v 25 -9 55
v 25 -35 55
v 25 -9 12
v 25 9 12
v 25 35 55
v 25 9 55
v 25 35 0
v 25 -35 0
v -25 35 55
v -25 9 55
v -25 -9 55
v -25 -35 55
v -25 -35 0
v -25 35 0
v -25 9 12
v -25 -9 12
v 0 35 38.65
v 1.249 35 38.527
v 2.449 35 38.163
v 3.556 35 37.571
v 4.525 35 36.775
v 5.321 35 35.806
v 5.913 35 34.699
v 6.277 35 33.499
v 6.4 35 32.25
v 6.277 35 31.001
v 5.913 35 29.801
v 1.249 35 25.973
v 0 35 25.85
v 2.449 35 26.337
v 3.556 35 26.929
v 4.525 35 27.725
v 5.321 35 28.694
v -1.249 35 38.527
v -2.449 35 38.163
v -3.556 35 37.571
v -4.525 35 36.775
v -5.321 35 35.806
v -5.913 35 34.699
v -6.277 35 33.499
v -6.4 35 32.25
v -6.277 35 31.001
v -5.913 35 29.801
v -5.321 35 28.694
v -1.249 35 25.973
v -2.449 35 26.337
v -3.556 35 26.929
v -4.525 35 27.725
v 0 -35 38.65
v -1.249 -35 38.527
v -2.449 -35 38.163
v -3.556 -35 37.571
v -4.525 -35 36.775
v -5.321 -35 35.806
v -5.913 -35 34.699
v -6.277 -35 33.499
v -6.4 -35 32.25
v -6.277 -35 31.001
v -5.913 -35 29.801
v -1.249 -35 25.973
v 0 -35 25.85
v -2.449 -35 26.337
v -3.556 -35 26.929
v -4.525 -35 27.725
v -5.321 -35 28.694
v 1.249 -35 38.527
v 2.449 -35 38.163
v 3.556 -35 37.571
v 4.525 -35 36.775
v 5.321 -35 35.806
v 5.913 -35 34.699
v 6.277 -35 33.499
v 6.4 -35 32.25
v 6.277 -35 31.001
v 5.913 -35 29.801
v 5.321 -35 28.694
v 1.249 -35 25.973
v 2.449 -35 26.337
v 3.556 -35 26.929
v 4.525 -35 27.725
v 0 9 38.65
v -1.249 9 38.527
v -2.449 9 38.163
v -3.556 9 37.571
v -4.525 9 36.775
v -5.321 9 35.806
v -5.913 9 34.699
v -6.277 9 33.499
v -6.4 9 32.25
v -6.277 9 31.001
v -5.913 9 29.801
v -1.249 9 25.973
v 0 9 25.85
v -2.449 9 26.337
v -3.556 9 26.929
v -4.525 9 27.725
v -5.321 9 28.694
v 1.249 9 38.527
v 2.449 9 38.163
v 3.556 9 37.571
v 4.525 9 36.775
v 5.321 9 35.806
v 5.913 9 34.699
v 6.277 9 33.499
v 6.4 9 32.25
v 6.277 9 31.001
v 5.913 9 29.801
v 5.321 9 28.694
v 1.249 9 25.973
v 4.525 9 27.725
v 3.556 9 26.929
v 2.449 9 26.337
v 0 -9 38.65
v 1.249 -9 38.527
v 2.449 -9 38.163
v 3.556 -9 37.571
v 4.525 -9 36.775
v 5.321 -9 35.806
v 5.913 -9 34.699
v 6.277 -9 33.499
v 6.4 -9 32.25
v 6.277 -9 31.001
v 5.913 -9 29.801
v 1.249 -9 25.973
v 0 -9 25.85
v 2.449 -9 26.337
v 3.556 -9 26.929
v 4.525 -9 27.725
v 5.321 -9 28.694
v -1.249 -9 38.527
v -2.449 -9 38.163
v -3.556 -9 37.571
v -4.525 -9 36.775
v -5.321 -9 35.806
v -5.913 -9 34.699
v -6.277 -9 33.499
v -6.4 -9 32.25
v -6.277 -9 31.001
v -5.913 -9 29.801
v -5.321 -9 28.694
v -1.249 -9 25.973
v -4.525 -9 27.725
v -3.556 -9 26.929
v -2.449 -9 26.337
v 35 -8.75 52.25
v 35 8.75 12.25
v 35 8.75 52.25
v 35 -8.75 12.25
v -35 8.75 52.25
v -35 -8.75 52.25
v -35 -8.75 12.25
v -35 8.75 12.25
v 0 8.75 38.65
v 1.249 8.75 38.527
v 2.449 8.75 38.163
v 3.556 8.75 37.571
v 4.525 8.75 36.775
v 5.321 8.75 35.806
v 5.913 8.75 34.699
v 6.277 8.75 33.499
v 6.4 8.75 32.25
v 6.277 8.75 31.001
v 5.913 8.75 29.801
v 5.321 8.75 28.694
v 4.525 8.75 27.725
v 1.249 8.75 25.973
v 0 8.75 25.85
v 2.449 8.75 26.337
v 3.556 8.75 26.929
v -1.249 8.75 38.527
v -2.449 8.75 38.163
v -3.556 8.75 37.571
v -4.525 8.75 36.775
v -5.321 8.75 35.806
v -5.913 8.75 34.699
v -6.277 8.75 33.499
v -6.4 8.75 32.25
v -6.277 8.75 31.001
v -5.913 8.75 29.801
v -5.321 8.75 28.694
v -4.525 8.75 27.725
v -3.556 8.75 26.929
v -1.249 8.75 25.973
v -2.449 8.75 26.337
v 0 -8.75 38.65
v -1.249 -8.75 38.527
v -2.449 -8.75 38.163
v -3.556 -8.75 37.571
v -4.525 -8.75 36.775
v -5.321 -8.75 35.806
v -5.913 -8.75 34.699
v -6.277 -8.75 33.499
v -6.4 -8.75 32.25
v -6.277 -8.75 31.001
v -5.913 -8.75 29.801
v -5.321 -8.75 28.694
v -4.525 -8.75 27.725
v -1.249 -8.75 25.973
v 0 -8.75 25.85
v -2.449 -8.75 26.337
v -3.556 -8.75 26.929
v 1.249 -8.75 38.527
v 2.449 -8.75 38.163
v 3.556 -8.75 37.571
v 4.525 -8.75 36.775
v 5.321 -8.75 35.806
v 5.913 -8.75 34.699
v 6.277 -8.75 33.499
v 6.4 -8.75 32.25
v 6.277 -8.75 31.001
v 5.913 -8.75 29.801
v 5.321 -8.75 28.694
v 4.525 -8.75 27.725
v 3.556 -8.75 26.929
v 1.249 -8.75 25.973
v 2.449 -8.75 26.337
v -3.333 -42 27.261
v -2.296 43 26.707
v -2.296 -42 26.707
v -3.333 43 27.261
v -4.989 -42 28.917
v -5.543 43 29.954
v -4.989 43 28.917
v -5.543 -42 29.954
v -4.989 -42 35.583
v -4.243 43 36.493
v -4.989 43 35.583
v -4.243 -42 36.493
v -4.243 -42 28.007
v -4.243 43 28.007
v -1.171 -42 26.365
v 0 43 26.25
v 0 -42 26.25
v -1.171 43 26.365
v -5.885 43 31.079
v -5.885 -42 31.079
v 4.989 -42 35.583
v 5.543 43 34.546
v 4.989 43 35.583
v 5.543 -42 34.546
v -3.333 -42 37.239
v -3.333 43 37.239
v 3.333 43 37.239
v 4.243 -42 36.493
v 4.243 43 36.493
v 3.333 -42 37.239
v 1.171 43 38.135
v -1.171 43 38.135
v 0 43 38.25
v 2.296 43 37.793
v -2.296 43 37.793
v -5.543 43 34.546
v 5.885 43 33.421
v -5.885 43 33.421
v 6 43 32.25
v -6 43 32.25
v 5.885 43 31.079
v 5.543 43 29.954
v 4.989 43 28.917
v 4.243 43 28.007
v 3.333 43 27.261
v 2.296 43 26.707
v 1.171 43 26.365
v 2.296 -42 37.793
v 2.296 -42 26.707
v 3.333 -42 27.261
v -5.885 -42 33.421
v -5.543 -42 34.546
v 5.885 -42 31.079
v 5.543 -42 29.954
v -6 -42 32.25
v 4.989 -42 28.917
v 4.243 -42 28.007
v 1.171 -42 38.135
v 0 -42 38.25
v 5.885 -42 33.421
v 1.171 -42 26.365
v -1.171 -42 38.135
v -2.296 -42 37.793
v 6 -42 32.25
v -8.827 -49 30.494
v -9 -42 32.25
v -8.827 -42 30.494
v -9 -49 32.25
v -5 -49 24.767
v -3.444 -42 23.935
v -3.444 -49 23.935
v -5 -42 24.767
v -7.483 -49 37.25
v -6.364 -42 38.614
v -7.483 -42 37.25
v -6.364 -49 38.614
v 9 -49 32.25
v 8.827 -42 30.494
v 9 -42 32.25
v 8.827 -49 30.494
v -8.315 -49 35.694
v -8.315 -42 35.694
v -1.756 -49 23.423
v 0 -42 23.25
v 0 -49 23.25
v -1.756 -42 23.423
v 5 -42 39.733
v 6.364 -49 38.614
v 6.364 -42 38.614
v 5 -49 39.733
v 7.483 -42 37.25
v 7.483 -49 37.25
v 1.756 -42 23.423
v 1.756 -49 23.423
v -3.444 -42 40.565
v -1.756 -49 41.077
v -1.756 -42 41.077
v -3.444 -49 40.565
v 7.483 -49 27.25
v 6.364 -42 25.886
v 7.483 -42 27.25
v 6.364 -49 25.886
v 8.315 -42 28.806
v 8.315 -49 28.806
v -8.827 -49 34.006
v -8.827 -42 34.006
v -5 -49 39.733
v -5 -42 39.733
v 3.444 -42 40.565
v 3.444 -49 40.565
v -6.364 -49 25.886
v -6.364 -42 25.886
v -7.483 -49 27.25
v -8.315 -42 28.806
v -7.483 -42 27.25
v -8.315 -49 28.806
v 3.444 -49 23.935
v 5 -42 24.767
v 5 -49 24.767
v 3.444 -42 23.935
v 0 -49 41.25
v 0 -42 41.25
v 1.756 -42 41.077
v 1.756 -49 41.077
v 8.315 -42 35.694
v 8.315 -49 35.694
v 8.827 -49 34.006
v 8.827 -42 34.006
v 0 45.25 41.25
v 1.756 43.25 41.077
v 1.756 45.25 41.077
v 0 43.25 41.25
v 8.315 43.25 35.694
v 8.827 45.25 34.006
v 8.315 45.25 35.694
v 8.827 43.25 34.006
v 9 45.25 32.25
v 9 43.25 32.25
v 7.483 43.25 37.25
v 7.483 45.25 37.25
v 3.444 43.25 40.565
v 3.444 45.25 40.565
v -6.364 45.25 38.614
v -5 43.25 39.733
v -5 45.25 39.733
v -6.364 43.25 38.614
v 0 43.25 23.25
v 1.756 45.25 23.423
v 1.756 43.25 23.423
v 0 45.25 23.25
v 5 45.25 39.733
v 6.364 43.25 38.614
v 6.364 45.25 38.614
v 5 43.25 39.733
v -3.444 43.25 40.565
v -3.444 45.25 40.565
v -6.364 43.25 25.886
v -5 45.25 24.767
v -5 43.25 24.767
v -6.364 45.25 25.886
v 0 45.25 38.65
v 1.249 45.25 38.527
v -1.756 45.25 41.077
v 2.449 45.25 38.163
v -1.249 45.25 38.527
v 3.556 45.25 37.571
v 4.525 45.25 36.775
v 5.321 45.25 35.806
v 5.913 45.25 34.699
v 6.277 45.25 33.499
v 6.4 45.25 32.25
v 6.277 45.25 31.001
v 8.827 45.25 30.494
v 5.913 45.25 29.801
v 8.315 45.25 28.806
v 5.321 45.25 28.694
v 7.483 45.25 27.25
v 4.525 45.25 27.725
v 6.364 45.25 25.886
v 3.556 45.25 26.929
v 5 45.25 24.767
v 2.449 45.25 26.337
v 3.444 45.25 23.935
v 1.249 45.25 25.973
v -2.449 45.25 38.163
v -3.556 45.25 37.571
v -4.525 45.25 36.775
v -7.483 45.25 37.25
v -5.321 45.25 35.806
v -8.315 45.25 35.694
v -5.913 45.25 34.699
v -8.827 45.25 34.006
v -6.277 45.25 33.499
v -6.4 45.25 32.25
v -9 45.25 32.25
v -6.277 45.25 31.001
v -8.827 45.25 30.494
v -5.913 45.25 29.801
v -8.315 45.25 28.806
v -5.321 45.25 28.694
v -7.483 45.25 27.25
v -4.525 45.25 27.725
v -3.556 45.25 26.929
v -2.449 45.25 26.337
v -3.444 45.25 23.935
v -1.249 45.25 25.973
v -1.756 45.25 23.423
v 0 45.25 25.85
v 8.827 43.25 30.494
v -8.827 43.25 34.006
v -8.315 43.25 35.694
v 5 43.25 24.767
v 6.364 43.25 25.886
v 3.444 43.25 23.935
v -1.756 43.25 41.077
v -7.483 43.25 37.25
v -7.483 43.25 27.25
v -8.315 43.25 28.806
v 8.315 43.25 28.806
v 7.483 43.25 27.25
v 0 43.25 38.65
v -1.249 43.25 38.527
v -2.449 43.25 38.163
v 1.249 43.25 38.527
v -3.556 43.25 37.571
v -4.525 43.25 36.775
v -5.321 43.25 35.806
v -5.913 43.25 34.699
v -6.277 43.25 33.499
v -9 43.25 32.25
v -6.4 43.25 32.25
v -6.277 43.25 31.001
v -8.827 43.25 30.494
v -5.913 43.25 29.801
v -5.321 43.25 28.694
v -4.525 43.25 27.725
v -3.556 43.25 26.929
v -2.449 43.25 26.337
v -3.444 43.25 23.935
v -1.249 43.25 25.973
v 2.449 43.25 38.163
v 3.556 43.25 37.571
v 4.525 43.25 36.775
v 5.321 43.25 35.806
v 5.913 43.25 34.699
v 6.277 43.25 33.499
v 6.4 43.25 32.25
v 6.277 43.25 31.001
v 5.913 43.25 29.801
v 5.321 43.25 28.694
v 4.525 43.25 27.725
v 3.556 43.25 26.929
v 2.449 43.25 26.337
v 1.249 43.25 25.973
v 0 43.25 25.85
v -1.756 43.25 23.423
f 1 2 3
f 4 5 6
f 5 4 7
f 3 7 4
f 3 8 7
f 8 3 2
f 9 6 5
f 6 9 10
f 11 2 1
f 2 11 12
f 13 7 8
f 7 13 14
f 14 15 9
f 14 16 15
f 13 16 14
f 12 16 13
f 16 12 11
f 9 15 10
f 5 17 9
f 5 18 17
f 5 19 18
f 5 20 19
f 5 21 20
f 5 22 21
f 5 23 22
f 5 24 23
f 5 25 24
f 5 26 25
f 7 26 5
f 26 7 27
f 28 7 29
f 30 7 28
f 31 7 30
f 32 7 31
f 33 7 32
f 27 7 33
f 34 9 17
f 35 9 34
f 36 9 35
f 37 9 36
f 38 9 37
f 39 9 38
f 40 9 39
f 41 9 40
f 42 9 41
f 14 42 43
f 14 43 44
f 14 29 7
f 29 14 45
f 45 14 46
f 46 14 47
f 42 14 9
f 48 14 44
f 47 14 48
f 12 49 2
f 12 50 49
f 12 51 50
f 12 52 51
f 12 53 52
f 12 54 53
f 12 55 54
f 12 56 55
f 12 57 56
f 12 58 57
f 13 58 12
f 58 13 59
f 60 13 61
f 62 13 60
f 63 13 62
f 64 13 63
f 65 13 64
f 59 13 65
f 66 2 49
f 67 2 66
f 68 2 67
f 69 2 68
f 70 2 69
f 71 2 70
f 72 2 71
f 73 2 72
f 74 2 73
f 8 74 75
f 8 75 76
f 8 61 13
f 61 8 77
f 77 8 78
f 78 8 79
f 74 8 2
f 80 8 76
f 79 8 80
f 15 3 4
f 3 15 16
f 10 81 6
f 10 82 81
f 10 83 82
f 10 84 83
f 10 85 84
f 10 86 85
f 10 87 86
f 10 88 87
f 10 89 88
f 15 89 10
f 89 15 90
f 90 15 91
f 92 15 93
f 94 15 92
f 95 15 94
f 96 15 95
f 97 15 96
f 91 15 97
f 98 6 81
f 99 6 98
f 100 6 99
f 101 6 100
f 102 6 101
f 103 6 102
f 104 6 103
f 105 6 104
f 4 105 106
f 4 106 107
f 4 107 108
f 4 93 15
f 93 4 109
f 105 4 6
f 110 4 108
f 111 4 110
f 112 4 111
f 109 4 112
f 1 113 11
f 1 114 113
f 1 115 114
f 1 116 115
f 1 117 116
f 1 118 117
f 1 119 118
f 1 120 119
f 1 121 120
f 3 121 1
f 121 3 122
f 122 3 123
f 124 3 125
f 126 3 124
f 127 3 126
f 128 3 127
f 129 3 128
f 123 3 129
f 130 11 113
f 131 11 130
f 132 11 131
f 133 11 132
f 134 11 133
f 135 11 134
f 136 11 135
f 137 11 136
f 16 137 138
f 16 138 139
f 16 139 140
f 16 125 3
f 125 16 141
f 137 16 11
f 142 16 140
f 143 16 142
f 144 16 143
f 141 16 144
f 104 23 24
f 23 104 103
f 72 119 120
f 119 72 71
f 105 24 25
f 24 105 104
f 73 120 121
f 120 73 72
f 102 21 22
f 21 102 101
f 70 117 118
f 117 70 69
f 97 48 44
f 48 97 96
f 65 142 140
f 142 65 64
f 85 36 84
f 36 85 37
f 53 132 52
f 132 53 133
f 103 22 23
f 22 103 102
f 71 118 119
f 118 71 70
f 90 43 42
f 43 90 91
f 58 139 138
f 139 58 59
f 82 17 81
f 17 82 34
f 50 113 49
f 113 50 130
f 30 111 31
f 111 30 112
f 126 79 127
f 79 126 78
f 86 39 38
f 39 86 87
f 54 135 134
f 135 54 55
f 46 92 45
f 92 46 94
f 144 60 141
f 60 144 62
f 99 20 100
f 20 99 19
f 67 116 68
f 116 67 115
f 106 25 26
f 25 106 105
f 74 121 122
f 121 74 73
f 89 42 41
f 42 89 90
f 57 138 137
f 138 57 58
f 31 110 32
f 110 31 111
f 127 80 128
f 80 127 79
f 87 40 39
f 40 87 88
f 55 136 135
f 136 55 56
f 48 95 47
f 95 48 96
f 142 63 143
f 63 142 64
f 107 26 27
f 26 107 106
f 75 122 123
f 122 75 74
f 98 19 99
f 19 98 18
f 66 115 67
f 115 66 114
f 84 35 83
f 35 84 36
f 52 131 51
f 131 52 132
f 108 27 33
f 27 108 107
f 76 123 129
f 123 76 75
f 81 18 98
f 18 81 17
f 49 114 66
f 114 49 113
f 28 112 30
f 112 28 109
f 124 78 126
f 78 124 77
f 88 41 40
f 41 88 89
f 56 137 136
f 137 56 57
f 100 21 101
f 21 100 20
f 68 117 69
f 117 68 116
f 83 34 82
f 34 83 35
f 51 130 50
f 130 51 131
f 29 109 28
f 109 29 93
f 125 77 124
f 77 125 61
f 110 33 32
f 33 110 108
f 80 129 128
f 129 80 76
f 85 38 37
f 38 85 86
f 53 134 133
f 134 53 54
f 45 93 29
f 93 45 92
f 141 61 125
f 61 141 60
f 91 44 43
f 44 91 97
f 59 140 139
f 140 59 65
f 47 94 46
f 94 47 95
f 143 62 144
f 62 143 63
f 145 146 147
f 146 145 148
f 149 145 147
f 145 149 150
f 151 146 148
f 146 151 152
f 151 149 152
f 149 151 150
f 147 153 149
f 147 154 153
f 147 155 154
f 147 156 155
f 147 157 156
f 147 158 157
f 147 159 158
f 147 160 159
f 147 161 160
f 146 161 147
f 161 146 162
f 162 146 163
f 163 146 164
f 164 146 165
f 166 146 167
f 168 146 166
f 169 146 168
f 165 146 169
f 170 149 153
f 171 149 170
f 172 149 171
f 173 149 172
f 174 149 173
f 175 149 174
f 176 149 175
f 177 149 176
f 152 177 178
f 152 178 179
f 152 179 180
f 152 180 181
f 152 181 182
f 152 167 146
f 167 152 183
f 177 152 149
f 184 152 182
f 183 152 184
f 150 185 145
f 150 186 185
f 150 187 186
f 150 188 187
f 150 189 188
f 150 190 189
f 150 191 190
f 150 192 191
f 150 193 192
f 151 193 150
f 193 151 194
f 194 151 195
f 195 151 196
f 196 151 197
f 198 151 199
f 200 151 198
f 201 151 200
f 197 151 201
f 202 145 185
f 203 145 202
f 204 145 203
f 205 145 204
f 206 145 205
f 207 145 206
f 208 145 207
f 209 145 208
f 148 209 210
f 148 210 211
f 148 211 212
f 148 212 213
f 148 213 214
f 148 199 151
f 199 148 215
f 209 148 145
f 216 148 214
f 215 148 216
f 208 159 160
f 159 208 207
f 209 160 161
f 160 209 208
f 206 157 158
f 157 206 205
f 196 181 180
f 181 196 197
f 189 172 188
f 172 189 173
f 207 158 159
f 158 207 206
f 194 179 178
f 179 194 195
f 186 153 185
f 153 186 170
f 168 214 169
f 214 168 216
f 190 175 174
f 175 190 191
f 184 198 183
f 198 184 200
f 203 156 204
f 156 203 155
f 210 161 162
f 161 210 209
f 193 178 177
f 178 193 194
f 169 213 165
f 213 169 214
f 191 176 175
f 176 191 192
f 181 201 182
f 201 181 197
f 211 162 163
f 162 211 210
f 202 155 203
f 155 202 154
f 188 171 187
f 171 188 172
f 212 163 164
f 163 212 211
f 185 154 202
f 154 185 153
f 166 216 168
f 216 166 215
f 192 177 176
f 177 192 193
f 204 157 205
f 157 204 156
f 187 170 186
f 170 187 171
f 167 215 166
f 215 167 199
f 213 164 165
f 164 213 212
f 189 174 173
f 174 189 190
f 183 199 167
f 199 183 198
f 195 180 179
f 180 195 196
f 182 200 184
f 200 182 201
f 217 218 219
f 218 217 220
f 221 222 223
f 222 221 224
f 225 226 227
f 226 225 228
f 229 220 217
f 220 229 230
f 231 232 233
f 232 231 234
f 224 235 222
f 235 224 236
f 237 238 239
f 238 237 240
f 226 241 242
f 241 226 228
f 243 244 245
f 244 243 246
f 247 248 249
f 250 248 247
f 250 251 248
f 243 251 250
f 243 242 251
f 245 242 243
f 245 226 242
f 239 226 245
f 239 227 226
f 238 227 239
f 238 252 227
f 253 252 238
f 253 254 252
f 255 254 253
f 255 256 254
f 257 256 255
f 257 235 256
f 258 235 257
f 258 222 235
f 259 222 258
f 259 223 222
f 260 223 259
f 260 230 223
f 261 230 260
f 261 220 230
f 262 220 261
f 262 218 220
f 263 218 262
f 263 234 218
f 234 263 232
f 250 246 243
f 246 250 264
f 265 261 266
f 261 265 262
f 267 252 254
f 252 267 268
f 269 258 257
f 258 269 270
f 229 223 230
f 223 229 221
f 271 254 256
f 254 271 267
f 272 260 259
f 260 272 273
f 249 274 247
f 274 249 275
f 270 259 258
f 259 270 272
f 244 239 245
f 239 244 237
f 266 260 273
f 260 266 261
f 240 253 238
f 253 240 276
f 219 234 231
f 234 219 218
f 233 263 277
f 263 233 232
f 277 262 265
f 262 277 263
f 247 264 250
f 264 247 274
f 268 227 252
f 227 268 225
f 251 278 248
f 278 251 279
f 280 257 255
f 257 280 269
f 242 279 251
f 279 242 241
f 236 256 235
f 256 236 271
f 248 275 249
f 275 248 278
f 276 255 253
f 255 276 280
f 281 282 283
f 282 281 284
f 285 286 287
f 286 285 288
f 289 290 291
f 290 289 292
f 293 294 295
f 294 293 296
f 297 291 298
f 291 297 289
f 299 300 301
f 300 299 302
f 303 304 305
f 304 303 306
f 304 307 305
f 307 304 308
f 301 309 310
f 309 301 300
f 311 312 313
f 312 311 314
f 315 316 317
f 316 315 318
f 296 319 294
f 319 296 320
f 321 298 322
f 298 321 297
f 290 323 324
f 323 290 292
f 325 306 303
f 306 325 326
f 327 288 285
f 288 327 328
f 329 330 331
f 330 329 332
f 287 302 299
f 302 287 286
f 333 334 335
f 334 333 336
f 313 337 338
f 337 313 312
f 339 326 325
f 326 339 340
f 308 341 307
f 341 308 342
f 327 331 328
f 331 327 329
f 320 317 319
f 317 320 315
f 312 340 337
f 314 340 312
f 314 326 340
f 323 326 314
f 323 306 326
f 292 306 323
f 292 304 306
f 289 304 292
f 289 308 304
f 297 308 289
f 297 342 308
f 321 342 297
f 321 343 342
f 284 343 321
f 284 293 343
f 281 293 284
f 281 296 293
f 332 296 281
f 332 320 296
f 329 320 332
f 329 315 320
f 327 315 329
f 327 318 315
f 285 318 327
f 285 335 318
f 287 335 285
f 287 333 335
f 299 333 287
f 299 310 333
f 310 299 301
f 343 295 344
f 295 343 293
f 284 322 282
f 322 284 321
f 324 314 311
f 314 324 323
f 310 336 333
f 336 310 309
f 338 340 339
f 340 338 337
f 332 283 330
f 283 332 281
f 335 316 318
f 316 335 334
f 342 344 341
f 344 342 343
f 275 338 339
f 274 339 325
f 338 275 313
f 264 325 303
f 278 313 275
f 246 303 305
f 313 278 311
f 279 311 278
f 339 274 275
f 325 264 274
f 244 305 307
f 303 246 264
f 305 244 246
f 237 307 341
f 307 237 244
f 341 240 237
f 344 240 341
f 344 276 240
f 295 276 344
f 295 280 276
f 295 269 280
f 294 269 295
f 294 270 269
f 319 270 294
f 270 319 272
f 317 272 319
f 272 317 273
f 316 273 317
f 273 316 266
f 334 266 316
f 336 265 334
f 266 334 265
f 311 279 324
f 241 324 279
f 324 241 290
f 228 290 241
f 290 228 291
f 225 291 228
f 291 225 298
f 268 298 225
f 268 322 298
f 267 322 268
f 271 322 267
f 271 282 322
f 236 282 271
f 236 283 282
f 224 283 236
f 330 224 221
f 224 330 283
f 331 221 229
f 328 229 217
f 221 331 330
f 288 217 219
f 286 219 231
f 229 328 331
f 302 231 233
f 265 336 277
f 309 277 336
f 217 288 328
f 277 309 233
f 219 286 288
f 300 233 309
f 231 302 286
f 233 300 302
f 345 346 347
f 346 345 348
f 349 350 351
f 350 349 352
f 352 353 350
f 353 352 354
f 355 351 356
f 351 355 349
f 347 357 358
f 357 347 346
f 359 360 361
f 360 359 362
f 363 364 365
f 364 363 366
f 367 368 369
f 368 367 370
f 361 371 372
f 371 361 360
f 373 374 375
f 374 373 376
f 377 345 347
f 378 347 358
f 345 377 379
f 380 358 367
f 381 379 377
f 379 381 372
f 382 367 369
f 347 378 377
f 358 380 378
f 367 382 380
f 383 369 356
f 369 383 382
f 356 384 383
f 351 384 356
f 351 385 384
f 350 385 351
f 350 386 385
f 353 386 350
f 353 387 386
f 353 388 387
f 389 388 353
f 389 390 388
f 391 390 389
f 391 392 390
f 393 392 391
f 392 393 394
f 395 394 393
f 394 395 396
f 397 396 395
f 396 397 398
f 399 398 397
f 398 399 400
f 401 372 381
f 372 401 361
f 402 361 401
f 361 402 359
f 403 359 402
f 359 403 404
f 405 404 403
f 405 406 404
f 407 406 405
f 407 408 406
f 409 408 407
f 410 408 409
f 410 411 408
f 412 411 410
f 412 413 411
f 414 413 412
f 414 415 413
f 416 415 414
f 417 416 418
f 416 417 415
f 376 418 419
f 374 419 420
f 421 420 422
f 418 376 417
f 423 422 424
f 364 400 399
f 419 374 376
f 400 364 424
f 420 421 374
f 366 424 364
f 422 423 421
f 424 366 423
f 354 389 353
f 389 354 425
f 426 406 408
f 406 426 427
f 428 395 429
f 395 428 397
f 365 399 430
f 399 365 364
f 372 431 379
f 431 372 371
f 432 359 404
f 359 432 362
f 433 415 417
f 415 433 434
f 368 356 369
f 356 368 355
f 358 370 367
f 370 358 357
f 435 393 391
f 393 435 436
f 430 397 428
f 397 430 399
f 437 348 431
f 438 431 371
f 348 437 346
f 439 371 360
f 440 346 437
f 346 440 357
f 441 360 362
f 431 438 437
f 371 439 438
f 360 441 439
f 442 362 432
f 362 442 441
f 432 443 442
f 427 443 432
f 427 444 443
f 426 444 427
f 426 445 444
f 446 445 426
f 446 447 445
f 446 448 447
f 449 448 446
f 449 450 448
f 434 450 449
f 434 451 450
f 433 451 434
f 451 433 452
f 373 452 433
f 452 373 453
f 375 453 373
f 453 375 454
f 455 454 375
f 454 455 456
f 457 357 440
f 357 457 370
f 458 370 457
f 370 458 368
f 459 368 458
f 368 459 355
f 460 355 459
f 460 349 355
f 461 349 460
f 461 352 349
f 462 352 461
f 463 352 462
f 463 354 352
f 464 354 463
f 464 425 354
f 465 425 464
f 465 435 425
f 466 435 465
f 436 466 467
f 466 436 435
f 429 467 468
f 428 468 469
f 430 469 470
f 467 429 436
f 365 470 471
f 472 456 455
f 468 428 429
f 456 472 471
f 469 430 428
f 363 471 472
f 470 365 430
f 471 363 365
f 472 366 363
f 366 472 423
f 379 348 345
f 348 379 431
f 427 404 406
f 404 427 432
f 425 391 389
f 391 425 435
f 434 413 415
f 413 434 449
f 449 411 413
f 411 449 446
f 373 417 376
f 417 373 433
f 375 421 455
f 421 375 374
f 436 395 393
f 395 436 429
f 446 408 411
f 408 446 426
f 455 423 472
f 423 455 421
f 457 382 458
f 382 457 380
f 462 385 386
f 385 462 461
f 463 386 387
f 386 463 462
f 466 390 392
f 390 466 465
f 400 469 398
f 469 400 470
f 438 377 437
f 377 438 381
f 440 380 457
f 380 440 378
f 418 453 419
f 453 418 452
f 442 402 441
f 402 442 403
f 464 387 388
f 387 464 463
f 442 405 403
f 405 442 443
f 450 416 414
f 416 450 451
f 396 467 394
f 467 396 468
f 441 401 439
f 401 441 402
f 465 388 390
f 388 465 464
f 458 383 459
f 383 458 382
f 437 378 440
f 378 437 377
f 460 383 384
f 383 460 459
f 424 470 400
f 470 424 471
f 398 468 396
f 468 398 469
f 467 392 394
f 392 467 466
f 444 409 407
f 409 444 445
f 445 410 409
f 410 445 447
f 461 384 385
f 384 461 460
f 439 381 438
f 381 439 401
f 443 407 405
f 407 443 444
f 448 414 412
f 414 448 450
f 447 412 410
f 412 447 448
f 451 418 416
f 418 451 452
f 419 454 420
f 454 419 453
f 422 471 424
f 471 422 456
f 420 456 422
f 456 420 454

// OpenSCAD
$fn = 32;

// ------------------------------------------------------------------------
// Clevis joint: 50 mm clevis, pin d12
// Every part is its own module, assembly() places them once.
// ------------------------------------------------------------------------

// --- part 1 ---
module clevis() {
  difference() {
    translate([-25, -35, 0]) cube([50, 70, 55]);
    translate([-26, -9, 12]) cube([52, 18, 44]);
    translate([0, 0, 32.25]) rotate([90, 0, 0]) cylinder(h = 72, d = 12.8, center = true);
  }
}

// --- part 2 ---
module eye() {
  difference() {
    translate([-35, -8.75, 0]) cube([70, 17.5, 40]);
    translate([0, 0, 20]) rotate([90, 0, 0]) cylinder(h = 19.5, d = 12.8, center = true);
  }
}

// --- part 3 ---
module pin() {
  rotate([0, 90, 0]) cylinder(h = 86, d = 12, center = true);
  translate([-49, 0, 0]) rotate([0, 90, 0]) cylinder(h = 7, d = 18);
}

// --- part 4 ---
module retainer() {
  difference() {
      translate([0, 0, 0]) cylinder(h = 2, d = 18);
      translate([0, 0, -1]) cylinder(h = 4, d = 12.8);
    }
}

// --- assembly ---
module assembly() {
  translate([0, 0, 0]) rotate([0, 0, 0]) clevis();
  translate([0, 0, 12.25]) rotate([0, 0, 0]) eye();
  translate([0, 0, 32.25]) rotate([0, 0, 90]) pin();
  translate([0, 45.25, 32.25]) rotate([90, 0, 0]) retainer();
}

assembly();
